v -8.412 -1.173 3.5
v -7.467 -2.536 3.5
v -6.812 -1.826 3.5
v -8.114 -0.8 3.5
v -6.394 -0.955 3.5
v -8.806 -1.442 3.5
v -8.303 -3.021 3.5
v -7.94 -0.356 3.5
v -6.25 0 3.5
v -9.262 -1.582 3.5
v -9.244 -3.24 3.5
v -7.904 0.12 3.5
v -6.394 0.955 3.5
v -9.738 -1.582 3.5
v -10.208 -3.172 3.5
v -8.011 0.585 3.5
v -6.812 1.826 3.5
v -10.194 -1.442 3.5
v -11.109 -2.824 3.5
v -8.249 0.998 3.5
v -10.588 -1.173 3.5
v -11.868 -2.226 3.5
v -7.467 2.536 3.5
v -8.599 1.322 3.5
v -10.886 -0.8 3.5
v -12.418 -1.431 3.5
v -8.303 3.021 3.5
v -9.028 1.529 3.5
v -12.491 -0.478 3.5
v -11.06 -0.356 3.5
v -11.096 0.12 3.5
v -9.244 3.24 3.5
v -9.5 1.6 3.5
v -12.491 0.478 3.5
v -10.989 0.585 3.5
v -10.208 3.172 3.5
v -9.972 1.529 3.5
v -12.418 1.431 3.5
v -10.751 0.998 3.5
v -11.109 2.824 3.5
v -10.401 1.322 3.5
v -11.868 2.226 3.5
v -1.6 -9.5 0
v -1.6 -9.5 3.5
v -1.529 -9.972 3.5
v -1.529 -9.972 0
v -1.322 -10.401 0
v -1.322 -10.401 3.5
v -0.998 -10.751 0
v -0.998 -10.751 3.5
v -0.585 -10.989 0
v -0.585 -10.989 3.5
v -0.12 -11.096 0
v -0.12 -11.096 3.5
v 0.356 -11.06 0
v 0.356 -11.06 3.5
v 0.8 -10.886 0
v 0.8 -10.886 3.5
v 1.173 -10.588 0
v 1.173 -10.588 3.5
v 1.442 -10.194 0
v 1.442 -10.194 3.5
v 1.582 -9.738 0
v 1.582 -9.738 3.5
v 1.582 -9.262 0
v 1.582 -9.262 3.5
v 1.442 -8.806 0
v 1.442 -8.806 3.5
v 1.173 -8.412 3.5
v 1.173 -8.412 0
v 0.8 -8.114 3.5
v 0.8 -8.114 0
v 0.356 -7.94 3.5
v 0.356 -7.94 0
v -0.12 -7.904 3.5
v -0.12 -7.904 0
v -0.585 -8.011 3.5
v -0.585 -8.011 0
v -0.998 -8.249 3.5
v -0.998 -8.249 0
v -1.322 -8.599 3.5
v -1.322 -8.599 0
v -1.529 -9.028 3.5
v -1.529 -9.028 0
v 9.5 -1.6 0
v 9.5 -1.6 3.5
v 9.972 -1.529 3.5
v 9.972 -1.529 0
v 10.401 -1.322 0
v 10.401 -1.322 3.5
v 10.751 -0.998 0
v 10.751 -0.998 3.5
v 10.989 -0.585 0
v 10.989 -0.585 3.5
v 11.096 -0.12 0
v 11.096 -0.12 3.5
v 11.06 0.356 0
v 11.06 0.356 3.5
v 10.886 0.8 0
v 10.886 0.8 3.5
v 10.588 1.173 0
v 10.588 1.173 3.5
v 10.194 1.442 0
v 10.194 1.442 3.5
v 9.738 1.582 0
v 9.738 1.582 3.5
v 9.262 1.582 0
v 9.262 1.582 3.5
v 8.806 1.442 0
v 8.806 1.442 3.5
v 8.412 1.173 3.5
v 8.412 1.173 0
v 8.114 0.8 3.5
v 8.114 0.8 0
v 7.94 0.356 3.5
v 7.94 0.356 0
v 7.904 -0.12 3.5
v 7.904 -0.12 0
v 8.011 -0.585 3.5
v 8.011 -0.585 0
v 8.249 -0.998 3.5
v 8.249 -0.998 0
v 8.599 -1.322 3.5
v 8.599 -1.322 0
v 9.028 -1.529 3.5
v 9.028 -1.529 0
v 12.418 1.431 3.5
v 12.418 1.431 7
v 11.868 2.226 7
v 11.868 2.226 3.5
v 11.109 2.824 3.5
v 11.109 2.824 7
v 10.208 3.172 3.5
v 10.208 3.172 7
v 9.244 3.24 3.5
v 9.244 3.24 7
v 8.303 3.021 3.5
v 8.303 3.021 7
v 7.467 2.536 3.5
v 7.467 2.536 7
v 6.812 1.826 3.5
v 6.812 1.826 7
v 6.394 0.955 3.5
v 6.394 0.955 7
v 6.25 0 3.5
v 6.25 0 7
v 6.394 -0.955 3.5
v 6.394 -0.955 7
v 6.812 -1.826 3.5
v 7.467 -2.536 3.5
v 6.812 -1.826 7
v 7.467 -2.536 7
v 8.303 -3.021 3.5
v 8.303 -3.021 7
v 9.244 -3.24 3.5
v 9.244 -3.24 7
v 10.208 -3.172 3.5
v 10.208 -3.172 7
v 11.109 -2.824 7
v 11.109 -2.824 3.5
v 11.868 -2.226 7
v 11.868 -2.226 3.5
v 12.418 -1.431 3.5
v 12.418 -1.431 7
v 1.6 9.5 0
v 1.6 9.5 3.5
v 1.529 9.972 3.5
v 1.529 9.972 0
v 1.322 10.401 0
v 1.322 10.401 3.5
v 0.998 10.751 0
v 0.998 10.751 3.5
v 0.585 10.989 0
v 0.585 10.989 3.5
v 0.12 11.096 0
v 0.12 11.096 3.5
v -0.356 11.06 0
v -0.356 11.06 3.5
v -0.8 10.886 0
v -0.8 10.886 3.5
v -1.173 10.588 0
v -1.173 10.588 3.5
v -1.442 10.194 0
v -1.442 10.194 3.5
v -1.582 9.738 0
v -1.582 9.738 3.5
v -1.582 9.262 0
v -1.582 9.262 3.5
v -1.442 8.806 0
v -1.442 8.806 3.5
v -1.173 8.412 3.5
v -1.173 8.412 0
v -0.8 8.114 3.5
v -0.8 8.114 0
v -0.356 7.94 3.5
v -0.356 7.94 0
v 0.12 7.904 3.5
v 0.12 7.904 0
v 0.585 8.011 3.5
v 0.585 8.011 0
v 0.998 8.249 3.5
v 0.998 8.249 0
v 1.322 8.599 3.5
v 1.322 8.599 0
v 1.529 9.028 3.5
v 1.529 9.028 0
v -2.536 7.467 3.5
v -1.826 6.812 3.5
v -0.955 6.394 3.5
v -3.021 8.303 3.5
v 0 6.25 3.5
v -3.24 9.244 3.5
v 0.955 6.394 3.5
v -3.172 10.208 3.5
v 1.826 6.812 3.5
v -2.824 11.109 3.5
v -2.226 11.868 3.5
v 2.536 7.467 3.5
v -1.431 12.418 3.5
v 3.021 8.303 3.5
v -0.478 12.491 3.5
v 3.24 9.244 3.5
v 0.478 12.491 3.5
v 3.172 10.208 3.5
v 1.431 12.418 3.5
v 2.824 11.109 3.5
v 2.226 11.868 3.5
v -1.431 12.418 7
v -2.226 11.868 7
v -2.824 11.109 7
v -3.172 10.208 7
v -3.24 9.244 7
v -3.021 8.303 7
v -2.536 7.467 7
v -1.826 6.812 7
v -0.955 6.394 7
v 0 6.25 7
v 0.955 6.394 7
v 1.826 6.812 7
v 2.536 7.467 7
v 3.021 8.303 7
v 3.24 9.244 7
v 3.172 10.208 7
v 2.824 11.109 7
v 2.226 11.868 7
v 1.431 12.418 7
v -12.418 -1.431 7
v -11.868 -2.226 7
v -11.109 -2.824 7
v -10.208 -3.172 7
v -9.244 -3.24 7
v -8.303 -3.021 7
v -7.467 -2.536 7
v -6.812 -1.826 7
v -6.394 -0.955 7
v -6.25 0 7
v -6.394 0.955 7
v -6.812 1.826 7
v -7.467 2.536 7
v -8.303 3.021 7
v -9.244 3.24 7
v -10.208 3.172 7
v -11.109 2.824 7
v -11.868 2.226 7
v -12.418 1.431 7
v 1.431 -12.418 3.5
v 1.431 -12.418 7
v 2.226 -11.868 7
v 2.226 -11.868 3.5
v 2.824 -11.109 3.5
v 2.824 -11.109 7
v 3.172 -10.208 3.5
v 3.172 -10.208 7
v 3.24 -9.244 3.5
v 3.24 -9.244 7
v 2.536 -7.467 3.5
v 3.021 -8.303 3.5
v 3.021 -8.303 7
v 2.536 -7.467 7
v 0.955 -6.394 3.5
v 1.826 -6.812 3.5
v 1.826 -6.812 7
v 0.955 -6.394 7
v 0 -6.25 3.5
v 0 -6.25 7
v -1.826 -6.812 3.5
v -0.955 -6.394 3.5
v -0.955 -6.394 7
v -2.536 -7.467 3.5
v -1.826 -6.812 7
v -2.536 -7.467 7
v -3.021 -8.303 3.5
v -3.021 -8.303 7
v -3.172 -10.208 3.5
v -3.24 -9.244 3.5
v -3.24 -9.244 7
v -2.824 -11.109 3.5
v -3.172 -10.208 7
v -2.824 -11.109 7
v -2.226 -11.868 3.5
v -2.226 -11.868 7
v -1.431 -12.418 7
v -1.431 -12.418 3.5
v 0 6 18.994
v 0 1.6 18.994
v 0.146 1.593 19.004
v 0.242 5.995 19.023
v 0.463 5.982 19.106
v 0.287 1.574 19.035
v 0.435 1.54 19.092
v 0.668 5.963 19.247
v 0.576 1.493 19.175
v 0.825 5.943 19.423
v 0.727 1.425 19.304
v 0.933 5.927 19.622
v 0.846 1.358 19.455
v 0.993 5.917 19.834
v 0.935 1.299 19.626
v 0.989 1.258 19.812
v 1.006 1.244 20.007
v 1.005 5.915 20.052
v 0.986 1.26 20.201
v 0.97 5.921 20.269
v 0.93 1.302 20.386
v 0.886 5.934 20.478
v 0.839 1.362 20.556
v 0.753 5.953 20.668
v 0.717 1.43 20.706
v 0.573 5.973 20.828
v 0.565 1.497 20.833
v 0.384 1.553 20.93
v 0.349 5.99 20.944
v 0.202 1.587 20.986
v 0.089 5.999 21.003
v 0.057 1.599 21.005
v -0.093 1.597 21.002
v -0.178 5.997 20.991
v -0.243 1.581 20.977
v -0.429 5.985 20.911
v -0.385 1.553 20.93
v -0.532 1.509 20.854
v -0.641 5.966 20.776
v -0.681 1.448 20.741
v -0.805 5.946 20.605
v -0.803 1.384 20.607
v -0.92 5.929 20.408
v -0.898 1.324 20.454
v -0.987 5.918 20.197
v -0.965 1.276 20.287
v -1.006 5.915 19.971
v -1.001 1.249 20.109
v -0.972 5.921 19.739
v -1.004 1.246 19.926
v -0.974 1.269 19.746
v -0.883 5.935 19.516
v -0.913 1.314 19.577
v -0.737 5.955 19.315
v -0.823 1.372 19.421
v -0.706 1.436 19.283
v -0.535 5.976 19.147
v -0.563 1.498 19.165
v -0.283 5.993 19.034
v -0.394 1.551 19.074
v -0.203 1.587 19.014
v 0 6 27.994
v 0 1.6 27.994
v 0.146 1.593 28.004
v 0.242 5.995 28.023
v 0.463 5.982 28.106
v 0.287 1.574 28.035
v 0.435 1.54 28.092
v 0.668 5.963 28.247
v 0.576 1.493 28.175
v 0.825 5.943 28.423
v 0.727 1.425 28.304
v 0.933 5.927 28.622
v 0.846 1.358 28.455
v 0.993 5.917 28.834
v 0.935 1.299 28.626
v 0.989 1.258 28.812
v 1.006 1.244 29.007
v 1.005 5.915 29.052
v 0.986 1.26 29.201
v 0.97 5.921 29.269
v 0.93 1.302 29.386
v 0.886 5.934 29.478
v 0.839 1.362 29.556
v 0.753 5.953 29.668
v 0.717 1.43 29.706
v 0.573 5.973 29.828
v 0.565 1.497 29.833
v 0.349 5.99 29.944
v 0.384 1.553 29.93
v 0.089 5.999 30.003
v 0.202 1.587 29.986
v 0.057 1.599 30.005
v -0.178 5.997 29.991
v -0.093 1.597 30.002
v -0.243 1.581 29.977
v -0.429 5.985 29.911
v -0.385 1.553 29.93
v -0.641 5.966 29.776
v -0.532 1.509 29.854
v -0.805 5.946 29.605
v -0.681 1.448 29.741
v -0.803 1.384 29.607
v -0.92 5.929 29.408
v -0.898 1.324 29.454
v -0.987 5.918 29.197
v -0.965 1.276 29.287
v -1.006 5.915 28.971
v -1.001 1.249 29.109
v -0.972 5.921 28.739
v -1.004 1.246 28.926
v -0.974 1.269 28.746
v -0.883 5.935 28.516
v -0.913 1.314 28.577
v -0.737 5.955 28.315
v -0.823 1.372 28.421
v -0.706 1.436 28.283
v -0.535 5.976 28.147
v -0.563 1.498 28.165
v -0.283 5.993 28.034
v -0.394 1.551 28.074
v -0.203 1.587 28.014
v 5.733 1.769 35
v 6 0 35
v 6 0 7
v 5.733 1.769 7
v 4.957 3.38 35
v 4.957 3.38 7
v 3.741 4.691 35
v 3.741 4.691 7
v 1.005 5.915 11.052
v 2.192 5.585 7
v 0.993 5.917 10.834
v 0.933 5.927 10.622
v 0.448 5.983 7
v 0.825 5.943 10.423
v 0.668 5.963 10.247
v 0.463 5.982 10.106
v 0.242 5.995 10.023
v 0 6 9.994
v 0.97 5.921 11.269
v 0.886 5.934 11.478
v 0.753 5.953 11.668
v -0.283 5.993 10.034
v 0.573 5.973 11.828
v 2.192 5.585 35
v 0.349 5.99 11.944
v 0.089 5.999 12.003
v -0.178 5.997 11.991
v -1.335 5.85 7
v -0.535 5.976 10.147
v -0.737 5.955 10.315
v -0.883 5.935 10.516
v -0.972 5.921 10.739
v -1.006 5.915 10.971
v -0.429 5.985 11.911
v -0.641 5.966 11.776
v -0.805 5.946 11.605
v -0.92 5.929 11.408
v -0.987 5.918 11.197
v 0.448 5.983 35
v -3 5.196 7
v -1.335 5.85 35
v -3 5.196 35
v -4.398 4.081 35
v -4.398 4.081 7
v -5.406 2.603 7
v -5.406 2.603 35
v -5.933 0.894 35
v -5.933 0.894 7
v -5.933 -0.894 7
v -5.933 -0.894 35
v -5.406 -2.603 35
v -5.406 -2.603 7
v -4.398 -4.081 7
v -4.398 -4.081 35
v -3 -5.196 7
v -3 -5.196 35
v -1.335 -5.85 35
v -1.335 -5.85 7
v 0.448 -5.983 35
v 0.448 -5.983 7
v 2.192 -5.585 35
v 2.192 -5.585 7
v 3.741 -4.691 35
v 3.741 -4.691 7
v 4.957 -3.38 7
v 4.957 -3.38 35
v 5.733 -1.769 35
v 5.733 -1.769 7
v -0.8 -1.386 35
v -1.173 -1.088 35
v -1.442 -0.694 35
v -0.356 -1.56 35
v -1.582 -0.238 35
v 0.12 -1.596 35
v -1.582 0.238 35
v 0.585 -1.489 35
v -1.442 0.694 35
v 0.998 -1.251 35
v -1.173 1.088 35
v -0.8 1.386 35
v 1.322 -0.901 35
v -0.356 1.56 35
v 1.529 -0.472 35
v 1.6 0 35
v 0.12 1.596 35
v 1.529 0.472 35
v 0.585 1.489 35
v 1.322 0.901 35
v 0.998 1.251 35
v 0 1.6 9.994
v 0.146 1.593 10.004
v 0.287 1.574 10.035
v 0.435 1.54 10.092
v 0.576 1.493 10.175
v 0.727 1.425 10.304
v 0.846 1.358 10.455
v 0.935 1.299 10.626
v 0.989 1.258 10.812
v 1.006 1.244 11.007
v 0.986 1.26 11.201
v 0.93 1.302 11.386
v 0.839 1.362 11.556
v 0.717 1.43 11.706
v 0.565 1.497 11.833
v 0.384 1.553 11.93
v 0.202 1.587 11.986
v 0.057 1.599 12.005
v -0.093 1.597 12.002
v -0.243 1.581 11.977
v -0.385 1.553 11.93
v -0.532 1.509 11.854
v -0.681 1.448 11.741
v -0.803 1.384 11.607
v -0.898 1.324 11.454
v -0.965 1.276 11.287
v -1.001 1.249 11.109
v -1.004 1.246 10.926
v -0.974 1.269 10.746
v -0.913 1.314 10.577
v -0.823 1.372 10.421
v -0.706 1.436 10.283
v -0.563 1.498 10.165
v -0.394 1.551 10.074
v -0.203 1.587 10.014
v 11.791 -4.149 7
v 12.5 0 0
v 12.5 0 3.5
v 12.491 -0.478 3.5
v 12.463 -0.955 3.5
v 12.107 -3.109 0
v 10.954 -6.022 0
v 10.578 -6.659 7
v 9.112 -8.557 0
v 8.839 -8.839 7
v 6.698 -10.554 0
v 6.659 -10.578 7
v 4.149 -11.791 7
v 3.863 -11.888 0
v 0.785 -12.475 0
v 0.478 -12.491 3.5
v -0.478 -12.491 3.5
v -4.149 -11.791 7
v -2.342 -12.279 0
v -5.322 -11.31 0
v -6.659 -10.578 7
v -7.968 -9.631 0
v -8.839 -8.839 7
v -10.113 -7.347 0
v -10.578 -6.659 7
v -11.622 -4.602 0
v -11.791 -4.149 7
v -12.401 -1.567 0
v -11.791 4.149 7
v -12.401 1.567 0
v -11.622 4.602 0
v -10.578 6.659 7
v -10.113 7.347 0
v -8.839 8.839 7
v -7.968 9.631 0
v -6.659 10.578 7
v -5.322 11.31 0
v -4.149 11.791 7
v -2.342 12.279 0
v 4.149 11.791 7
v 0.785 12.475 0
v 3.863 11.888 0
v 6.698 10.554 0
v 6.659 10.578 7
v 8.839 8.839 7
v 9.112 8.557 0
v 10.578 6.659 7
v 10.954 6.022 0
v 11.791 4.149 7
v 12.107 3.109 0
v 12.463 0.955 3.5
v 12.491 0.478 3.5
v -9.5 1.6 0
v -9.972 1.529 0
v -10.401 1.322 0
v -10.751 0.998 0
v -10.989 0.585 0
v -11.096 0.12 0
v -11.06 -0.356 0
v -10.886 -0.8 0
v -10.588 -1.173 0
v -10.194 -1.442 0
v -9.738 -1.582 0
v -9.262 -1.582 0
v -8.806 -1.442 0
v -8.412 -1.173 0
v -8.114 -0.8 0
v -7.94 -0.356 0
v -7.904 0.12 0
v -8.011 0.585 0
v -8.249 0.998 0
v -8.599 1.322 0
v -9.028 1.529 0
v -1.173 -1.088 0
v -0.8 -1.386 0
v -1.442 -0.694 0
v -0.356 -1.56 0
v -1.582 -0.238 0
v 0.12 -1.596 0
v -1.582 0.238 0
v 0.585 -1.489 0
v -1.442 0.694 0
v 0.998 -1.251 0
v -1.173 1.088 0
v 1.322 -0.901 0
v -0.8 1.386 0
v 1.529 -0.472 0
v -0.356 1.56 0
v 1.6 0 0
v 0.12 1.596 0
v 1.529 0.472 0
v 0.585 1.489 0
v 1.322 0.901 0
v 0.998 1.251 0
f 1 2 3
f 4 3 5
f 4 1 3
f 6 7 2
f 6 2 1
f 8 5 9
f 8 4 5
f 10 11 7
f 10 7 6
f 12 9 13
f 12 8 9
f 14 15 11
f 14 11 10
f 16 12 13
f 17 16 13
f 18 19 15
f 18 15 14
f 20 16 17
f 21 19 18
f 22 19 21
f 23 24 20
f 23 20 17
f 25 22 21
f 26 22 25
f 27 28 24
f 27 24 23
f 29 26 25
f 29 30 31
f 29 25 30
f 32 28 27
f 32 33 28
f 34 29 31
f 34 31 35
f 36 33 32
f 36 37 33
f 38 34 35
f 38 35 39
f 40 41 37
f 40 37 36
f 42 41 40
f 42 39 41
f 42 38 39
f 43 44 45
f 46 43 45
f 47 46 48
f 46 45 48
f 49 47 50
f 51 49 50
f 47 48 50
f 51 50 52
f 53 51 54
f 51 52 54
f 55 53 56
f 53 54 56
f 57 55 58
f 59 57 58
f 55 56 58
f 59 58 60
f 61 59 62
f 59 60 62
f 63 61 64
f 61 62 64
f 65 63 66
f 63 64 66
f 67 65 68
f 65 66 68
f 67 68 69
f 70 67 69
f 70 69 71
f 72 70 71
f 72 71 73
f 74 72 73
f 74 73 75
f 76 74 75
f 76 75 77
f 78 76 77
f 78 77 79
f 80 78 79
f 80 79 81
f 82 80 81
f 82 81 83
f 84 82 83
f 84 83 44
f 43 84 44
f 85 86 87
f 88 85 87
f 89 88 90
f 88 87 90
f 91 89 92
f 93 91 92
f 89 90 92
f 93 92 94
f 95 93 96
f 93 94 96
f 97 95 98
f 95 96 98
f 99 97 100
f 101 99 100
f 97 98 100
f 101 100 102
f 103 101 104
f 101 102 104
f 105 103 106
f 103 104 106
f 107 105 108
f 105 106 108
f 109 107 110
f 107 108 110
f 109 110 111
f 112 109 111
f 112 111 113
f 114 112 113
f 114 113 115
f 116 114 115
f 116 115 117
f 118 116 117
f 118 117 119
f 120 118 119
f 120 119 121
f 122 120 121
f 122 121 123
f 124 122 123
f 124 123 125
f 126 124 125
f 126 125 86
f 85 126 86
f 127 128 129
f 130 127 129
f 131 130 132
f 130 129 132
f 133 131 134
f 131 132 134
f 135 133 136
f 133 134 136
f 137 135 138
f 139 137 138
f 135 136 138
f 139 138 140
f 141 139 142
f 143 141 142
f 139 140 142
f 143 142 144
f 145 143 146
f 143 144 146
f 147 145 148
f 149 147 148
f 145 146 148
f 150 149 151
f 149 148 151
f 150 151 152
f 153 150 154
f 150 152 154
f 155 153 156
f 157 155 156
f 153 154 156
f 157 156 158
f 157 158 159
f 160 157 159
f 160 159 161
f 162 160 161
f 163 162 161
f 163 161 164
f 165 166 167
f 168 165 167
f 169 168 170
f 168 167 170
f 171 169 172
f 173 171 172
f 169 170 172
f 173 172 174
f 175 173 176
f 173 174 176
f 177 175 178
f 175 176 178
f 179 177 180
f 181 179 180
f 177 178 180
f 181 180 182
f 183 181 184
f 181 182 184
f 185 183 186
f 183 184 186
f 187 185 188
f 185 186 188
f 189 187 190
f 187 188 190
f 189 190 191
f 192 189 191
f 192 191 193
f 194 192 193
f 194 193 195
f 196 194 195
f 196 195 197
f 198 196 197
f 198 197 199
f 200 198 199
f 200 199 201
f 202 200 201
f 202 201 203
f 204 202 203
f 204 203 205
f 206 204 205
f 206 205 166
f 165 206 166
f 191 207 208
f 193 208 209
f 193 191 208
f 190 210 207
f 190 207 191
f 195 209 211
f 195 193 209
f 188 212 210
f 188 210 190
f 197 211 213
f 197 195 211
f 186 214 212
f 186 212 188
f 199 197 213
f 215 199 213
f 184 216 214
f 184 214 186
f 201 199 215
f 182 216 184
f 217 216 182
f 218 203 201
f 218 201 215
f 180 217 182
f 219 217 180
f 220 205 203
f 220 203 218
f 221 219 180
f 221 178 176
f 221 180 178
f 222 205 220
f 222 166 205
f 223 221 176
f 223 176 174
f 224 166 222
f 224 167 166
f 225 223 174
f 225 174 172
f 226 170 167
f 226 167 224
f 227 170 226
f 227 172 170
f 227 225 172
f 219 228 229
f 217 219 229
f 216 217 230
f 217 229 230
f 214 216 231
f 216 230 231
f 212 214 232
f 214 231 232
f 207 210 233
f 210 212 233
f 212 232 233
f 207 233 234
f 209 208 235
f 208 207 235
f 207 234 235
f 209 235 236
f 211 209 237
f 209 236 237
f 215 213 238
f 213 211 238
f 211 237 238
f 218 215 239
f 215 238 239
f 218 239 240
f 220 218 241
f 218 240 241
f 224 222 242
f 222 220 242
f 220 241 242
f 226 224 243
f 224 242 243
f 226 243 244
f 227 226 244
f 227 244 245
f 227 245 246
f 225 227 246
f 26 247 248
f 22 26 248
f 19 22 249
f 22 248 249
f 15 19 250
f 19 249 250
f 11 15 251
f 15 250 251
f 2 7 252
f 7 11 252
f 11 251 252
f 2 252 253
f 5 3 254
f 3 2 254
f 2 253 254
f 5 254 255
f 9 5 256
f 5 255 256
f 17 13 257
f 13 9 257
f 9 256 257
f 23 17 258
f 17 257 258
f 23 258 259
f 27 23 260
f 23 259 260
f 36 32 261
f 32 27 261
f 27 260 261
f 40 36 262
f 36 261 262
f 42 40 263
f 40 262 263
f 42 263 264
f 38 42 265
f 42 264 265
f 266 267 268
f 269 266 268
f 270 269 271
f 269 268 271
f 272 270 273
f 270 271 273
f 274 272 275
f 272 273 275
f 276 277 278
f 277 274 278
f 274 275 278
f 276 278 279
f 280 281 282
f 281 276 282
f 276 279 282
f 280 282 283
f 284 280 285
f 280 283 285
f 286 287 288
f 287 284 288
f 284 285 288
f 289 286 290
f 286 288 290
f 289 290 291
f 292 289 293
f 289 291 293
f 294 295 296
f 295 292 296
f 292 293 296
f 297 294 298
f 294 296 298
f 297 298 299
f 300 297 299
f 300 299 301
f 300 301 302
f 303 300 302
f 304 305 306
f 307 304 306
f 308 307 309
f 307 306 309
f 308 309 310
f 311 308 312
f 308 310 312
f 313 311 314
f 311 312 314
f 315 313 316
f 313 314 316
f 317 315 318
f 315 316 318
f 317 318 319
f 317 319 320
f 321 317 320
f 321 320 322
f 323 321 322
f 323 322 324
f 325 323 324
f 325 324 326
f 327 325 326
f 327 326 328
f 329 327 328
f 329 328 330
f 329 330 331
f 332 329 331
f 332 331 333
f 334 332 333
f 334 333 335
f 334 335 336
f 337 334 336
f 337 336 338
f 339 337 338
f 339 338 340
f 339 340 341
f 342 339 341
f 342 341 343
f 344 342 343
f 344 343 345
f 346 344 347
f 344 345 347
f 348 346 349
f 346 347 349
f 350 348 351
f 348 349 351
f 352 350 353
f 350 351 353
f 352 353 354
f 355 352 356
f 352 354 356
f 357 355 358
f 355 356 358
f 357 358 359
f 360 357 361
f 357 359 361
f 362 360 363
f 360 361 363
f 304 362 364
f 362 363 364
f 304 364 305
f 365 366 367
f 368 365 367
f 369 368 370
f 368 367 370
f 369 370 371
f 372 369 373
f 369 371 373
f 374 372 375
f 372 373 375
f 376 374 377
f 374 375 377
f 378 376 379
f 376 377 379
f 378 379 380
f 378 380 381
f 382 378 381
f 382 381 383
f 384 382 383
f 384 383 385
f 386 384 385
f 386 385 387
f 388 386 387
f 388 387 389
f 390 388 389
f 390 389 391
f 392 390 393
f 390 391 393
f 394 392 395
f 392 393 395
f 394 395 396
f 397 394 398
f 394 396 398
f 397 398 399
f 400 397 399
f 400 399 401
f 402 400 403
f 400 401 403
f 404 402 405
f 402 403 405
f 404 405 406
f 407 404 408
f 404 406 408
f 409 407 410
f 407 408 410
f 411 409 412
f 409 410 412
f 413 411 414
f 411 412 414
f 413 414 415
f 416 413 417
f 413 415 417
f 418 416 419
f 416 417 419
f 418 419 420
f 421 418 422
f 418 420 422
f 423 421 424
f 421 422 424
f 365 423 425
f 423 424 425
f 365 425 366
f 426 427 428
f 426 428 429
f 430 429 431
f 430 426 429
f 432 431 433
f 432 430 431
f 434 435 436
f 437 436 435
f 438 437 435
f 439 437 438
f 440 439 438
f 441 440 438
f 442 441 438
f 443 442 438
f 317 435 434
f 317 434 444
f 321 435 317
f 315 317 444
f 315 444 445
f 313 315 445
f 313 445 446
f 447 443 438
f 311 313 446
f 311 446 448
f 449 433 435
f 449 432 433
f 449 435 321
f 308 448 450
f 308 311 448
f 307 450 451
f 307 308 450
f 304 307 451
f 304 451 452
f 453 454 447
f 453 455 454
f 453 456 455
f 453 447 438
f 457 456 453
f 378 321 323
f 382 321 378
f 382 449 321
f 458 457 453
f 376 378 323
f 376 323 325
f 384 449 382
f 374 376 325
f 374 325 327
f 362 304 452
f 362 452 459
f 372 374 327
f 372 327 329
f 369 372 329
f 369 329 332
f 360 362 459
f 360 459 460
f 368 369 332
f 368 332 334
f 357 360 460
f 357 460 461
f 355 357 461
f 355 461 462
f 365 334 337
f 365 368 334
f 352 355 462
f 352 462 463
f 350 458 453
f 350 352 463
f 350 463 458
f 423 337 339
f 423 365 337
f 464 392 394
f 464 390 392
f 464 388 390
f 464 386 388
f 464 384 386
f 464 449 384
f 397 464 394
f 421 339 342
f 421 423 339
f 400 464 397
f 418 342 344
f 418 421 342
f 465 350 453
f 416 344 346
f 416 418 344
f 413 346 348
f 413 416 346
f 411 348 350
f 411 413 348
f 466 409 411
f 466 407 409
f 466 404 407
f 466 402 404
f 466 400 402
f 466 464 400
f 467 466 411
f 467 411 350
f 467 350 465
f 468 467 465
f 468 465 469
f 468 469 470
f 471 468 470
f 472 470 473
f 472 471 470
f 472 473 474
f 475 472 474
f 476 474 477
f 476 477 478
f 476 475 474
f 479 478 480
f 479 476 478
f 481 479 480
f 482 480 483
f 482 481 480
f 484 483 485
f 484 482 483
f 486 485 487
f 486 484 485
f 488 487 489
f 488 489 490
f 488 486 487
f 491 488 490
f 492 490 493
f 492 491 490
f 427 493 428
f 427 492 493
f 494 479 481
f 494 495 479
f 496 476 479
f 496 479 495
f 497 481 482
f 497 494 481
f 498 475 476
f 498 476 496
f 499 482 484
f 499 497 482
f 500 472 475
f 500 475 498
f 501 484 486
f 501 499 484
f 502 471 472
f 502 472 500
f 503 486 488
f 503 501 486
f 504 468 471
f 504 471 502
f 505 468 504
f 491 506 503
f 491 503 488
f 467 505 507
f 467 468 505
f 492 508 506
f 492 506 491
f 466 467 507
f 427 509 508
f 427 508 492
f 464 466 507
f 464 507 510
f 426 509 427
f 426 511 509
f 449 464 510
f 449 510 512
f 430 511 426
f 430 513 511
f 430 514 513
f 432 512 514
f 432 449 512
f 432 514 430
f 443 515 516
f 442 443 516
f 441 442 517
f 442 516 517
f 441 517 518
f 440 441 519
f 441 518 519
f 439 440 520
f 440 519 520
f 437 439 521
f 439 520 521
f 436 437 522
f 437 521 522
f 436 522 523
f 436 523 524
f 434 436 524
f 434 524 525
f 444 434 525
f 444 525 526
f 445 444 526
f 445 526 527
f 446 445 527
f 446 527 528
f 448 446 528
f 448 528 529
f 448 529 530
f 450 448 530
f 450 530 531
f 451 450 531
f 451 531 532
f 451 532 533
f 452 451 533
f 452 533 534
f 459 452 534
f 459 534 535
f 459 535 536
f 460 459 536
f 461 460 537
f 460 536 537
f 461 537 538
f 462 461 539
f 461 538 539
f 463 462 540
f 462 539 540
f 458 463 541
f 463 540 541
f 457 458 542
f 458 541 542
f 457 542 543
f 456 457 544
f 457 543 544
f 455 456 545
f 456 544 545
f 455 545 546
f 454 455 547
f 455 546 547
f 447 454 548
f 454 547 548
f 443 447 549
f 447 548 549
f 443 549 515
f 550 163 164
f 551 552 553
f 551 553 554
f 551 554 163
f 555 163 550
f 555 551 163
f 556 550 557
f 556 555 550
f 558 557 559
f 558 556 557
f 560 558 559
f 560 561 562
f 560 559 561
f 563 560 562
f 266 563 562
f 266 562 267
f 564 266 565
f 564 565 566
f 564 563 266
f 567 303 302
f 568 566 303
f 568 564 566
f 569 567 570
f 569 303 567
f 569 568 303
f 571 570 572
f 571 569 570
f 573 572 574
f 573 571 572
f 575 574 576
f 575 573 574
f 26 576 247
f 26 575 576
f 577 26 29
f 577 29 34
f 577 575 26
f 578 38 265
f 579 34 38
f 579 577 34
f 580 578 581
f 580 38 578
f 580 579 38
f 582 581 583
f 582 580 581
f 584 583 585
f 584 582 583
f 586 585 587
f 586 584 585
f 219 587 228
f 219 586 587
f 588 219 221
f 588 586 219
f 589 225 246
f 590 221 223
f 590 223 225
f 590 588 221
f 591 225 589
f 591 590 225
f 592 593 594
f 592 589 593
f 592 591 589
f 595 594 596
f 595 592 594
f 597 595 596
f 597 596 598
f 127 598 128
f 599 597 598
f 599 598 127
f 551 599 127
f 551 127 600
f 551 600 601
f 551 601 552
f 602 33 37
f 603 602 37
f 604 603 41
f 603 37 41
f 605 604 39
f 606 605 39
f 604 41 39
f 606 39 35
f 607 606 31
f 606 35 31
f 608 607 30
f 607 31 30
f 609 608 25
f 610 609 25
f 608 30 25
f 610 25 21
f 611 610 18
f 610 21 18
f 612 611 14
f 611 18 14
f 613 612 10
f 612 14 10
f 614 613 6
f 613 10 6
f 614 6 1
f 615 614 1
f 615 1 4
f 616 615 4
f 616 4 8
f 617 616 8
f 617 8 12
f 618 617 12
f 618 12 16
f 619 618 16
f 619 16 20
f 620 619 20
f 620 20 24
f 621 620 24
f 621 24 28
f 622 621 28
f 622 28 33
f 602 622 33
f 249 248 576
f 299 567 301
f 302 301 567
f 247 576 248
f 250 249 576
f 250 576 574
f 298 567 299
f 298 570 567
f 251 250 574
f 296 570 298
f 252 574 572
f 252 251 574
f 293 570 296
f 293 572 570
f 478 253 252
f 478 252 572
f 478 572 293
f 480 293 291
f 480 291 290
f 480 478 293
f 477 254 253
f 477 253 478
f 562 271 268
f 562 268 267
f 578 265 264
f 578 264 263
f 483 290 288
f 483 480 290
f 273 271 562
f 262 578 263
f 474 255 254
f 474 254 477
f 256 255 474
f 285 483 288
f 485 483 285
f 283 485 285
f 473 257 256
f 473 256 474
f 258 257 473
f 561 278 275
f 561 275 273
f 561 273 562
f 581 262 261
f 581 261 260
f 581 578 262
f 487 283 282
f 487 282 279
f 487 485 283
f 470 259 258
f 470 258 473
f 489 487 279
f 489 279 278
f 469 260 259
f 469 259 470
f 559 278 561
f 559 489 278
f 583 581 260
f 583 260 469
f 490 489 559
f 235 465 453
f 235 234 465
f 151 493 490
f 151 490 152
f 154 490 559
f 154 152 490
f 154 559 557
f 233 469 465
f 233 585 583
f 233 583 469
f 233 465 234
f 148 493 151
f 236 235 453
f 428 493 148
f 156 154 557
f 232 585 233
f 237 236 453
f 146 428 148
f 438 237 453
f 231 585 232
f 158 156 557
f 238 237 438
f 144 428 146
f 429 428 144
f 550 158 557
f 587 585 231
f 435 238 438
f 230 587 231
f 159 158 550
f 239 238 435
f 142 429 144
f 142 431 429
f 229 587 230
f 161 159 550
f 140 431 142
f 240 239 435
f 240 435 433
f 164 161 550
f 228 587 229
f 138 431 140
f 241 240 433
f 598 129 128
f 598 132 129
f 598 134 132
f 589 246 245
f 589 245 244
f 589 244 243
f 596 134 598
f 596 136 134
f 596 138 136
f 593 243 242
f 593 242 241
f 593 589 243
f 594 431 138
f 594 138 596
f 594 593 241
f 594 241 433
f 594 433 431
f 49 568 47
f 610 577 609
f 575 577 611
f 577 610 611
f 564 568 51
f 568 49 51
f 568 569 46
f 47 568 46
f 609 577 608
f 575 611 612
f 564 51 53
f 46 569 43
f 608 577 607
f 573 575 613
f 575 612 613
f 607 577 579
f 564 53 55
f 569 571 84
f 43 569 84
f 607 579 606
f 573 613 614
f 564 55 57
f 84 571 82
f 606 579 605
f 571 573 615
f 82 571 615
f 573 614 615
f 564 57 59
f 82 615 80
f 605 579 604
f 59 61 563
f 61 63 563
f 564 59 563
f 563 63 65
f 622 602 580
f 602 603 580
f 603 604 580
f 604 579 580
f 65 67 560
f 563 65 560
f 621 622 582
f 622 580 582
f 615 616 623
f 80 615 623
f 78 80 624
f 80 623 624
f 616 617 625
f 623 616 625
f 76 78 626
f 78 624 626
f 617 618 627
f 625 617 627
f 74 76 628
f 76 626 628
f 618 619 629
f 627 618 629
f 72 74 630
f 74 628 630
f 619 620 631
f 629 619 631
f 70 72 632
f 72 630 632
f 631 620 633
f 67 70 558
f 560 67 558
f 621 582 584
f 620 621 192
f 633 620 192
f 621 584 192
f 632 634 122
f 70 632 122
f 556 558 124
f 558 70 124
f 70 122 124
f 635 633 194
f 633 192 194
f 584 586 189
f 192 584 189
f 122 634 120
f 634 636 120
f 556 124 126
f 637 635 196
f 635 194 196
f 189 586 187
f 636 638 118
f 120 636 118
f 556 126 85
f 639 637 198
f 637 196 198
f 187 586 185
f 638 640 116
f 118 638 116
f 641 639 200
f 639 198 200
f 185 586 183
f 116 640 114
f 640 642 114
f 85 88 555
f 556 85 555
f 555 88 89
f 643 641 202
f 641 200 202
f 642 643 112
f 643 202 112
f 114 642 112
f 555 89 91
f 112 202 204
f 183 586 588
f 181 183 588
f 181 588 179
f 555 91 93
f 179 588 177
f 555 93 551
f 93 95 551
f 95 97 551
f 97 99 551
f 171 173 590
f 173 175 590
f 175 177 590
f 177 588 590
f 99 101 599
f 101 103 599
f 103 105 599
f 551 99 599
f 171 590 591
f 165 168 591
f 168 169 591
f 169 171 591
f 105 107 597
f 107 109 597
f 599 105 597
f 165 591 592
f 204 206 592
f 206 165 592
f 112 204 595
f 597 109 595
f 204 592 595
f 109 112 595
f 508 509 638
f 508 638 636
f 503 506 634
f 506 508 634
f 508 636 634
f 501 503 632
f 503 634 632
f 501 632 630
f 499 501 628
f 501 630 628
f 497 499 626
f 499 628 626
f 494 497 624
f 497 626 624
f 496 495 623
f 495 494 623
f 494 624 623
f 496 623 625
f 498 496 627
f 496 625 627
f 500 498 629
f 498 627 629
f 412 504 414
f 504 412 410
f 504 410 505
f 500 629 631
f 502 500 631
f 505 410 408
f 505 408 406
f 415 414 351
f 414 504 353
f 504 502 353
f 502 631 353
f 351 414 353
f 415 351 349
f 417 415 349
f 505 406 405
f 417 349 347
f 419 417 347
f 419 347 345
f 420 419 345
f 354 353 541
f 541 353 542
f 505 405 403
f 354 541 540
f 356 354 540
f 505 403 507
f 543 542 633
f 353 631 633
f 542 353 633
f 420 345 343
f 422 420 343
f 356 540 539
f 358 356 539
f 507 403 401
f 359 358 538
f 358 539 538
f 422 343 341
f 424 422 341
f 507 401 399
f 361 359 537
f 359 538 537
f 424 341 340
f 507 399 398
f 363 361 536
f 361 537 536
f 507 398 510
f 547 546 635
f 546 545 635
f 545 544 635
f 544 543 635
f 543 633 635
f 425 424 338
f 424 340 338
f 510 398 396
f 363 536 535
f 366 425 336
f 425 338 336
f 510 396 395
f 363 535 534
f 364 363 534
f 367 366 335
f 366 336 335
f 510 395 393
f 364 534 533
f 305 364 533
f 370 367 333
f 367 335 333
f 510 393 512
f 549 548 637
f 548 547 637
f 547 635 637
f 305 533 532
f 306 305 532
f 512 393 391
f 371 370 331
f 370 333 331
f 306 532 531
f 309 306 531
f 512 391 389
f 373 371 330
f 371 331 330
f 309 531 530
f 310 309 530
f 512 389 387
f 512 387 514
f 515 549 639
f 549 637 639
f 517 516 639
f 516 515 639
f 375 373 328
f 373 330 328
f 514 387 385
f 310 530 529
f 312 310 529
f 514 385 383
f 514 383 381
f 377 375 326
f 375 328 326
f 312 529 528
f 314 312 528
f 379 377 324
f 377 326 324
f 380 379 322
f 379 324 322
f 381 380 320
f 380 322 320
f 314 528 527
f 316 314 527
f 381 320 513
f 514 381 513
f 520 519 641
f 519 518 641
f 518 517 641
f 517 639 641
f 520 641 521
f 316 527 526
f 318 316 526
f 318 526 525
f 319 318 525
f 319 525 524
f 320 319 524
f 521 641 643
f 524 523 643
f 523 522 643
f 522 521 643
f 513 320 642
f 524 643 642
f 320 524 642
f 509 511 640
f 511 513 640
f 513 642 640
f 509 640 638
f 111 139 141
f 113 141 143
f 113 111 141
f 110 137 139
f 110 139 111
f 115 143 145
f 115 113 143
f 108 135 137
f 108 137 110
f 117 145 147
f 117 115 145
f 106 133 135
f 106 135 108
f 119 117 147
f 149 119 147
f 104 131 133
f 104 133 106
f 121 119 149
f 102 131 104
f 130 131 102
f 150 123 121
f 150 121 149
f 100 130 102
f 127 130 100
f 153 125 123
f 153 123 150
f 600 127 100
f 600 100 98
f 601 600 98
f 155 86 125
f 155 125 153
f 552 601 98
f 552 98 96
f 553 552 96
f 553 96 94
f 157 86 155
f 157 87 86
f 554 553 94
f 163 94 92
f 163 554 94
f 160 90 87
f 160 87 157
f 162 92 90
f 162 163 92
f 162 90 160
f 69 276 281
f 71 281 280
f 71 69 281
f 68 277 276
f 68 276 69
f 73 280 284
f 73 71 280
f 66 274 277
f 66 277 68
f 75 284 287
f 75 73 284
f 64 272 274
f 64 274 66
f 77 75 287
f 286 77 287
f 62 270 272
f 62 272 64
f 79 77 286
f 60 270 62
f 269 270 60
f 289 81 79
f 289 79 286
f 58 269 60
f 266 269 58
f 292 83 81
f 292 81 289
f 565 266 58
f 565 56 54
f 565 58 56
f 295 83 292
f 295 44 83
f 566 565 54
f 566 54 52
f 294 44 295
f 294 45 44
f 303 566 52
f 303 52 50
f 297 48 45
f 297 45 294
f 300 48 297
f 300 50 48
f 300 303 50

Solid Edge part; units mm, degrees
sketch "Sketch1" plane through (0, 0, 0) normal (0, 0, 1) x (1, 0, 0)
  circle A0 centre (0, 0) radius 12.5
  circle A1 centre (0, 0) radius 1.6
extrude "Protrusion1" add sketch "Sketch1" along normal blind 35
sketch "Sketch2" plane through (0, 0, 35) normal (0, 0, 1) x (1, 0, 0)
  circle A0 centre (0, 0) radius 12.5
  circle A1 centre (0, 0) radius 6
extrude "ExtrudedCutout_1" cut sketch "Sketch2" against normal blind 28
sketch "Sketch3" plane through (0, 0, 7) normal (0, 0, 1) x (1, 0, 0)
  circle A0 centre (0, 9.5) radius 1.6
  dimension "D1" = 9.5
extrude "Cutout1" cut sketch "Sketch3" against normal up to next
sketch "Sketch4" plane through (0, 0, 7) normal (0, 0, 1) x (1, 0, 0)
  circle A0 centre (0, 9.5) radius 3.25
extrude "ExtrudedCutout_3" cut sketch "Sketch4" against normal blind 3.5
pattern_circular "Pattern1" count 4 over 360 about axis through (0, 0, 7) along (0, 0, 1) of "Cutout1", "ExtrudedCutout_3"
hole "Hole_4" at (0, 0, 29) direction (0, 1, 0) diameter 2.013 end up to next
hole "Hole1" at (0, 0, 20) direction (0, 1, 0) diameter 2.013 end up to next
hole "Hole2" at (0, 0, 11) direction (0, 1, 0) diameter 2.013 end up to next
